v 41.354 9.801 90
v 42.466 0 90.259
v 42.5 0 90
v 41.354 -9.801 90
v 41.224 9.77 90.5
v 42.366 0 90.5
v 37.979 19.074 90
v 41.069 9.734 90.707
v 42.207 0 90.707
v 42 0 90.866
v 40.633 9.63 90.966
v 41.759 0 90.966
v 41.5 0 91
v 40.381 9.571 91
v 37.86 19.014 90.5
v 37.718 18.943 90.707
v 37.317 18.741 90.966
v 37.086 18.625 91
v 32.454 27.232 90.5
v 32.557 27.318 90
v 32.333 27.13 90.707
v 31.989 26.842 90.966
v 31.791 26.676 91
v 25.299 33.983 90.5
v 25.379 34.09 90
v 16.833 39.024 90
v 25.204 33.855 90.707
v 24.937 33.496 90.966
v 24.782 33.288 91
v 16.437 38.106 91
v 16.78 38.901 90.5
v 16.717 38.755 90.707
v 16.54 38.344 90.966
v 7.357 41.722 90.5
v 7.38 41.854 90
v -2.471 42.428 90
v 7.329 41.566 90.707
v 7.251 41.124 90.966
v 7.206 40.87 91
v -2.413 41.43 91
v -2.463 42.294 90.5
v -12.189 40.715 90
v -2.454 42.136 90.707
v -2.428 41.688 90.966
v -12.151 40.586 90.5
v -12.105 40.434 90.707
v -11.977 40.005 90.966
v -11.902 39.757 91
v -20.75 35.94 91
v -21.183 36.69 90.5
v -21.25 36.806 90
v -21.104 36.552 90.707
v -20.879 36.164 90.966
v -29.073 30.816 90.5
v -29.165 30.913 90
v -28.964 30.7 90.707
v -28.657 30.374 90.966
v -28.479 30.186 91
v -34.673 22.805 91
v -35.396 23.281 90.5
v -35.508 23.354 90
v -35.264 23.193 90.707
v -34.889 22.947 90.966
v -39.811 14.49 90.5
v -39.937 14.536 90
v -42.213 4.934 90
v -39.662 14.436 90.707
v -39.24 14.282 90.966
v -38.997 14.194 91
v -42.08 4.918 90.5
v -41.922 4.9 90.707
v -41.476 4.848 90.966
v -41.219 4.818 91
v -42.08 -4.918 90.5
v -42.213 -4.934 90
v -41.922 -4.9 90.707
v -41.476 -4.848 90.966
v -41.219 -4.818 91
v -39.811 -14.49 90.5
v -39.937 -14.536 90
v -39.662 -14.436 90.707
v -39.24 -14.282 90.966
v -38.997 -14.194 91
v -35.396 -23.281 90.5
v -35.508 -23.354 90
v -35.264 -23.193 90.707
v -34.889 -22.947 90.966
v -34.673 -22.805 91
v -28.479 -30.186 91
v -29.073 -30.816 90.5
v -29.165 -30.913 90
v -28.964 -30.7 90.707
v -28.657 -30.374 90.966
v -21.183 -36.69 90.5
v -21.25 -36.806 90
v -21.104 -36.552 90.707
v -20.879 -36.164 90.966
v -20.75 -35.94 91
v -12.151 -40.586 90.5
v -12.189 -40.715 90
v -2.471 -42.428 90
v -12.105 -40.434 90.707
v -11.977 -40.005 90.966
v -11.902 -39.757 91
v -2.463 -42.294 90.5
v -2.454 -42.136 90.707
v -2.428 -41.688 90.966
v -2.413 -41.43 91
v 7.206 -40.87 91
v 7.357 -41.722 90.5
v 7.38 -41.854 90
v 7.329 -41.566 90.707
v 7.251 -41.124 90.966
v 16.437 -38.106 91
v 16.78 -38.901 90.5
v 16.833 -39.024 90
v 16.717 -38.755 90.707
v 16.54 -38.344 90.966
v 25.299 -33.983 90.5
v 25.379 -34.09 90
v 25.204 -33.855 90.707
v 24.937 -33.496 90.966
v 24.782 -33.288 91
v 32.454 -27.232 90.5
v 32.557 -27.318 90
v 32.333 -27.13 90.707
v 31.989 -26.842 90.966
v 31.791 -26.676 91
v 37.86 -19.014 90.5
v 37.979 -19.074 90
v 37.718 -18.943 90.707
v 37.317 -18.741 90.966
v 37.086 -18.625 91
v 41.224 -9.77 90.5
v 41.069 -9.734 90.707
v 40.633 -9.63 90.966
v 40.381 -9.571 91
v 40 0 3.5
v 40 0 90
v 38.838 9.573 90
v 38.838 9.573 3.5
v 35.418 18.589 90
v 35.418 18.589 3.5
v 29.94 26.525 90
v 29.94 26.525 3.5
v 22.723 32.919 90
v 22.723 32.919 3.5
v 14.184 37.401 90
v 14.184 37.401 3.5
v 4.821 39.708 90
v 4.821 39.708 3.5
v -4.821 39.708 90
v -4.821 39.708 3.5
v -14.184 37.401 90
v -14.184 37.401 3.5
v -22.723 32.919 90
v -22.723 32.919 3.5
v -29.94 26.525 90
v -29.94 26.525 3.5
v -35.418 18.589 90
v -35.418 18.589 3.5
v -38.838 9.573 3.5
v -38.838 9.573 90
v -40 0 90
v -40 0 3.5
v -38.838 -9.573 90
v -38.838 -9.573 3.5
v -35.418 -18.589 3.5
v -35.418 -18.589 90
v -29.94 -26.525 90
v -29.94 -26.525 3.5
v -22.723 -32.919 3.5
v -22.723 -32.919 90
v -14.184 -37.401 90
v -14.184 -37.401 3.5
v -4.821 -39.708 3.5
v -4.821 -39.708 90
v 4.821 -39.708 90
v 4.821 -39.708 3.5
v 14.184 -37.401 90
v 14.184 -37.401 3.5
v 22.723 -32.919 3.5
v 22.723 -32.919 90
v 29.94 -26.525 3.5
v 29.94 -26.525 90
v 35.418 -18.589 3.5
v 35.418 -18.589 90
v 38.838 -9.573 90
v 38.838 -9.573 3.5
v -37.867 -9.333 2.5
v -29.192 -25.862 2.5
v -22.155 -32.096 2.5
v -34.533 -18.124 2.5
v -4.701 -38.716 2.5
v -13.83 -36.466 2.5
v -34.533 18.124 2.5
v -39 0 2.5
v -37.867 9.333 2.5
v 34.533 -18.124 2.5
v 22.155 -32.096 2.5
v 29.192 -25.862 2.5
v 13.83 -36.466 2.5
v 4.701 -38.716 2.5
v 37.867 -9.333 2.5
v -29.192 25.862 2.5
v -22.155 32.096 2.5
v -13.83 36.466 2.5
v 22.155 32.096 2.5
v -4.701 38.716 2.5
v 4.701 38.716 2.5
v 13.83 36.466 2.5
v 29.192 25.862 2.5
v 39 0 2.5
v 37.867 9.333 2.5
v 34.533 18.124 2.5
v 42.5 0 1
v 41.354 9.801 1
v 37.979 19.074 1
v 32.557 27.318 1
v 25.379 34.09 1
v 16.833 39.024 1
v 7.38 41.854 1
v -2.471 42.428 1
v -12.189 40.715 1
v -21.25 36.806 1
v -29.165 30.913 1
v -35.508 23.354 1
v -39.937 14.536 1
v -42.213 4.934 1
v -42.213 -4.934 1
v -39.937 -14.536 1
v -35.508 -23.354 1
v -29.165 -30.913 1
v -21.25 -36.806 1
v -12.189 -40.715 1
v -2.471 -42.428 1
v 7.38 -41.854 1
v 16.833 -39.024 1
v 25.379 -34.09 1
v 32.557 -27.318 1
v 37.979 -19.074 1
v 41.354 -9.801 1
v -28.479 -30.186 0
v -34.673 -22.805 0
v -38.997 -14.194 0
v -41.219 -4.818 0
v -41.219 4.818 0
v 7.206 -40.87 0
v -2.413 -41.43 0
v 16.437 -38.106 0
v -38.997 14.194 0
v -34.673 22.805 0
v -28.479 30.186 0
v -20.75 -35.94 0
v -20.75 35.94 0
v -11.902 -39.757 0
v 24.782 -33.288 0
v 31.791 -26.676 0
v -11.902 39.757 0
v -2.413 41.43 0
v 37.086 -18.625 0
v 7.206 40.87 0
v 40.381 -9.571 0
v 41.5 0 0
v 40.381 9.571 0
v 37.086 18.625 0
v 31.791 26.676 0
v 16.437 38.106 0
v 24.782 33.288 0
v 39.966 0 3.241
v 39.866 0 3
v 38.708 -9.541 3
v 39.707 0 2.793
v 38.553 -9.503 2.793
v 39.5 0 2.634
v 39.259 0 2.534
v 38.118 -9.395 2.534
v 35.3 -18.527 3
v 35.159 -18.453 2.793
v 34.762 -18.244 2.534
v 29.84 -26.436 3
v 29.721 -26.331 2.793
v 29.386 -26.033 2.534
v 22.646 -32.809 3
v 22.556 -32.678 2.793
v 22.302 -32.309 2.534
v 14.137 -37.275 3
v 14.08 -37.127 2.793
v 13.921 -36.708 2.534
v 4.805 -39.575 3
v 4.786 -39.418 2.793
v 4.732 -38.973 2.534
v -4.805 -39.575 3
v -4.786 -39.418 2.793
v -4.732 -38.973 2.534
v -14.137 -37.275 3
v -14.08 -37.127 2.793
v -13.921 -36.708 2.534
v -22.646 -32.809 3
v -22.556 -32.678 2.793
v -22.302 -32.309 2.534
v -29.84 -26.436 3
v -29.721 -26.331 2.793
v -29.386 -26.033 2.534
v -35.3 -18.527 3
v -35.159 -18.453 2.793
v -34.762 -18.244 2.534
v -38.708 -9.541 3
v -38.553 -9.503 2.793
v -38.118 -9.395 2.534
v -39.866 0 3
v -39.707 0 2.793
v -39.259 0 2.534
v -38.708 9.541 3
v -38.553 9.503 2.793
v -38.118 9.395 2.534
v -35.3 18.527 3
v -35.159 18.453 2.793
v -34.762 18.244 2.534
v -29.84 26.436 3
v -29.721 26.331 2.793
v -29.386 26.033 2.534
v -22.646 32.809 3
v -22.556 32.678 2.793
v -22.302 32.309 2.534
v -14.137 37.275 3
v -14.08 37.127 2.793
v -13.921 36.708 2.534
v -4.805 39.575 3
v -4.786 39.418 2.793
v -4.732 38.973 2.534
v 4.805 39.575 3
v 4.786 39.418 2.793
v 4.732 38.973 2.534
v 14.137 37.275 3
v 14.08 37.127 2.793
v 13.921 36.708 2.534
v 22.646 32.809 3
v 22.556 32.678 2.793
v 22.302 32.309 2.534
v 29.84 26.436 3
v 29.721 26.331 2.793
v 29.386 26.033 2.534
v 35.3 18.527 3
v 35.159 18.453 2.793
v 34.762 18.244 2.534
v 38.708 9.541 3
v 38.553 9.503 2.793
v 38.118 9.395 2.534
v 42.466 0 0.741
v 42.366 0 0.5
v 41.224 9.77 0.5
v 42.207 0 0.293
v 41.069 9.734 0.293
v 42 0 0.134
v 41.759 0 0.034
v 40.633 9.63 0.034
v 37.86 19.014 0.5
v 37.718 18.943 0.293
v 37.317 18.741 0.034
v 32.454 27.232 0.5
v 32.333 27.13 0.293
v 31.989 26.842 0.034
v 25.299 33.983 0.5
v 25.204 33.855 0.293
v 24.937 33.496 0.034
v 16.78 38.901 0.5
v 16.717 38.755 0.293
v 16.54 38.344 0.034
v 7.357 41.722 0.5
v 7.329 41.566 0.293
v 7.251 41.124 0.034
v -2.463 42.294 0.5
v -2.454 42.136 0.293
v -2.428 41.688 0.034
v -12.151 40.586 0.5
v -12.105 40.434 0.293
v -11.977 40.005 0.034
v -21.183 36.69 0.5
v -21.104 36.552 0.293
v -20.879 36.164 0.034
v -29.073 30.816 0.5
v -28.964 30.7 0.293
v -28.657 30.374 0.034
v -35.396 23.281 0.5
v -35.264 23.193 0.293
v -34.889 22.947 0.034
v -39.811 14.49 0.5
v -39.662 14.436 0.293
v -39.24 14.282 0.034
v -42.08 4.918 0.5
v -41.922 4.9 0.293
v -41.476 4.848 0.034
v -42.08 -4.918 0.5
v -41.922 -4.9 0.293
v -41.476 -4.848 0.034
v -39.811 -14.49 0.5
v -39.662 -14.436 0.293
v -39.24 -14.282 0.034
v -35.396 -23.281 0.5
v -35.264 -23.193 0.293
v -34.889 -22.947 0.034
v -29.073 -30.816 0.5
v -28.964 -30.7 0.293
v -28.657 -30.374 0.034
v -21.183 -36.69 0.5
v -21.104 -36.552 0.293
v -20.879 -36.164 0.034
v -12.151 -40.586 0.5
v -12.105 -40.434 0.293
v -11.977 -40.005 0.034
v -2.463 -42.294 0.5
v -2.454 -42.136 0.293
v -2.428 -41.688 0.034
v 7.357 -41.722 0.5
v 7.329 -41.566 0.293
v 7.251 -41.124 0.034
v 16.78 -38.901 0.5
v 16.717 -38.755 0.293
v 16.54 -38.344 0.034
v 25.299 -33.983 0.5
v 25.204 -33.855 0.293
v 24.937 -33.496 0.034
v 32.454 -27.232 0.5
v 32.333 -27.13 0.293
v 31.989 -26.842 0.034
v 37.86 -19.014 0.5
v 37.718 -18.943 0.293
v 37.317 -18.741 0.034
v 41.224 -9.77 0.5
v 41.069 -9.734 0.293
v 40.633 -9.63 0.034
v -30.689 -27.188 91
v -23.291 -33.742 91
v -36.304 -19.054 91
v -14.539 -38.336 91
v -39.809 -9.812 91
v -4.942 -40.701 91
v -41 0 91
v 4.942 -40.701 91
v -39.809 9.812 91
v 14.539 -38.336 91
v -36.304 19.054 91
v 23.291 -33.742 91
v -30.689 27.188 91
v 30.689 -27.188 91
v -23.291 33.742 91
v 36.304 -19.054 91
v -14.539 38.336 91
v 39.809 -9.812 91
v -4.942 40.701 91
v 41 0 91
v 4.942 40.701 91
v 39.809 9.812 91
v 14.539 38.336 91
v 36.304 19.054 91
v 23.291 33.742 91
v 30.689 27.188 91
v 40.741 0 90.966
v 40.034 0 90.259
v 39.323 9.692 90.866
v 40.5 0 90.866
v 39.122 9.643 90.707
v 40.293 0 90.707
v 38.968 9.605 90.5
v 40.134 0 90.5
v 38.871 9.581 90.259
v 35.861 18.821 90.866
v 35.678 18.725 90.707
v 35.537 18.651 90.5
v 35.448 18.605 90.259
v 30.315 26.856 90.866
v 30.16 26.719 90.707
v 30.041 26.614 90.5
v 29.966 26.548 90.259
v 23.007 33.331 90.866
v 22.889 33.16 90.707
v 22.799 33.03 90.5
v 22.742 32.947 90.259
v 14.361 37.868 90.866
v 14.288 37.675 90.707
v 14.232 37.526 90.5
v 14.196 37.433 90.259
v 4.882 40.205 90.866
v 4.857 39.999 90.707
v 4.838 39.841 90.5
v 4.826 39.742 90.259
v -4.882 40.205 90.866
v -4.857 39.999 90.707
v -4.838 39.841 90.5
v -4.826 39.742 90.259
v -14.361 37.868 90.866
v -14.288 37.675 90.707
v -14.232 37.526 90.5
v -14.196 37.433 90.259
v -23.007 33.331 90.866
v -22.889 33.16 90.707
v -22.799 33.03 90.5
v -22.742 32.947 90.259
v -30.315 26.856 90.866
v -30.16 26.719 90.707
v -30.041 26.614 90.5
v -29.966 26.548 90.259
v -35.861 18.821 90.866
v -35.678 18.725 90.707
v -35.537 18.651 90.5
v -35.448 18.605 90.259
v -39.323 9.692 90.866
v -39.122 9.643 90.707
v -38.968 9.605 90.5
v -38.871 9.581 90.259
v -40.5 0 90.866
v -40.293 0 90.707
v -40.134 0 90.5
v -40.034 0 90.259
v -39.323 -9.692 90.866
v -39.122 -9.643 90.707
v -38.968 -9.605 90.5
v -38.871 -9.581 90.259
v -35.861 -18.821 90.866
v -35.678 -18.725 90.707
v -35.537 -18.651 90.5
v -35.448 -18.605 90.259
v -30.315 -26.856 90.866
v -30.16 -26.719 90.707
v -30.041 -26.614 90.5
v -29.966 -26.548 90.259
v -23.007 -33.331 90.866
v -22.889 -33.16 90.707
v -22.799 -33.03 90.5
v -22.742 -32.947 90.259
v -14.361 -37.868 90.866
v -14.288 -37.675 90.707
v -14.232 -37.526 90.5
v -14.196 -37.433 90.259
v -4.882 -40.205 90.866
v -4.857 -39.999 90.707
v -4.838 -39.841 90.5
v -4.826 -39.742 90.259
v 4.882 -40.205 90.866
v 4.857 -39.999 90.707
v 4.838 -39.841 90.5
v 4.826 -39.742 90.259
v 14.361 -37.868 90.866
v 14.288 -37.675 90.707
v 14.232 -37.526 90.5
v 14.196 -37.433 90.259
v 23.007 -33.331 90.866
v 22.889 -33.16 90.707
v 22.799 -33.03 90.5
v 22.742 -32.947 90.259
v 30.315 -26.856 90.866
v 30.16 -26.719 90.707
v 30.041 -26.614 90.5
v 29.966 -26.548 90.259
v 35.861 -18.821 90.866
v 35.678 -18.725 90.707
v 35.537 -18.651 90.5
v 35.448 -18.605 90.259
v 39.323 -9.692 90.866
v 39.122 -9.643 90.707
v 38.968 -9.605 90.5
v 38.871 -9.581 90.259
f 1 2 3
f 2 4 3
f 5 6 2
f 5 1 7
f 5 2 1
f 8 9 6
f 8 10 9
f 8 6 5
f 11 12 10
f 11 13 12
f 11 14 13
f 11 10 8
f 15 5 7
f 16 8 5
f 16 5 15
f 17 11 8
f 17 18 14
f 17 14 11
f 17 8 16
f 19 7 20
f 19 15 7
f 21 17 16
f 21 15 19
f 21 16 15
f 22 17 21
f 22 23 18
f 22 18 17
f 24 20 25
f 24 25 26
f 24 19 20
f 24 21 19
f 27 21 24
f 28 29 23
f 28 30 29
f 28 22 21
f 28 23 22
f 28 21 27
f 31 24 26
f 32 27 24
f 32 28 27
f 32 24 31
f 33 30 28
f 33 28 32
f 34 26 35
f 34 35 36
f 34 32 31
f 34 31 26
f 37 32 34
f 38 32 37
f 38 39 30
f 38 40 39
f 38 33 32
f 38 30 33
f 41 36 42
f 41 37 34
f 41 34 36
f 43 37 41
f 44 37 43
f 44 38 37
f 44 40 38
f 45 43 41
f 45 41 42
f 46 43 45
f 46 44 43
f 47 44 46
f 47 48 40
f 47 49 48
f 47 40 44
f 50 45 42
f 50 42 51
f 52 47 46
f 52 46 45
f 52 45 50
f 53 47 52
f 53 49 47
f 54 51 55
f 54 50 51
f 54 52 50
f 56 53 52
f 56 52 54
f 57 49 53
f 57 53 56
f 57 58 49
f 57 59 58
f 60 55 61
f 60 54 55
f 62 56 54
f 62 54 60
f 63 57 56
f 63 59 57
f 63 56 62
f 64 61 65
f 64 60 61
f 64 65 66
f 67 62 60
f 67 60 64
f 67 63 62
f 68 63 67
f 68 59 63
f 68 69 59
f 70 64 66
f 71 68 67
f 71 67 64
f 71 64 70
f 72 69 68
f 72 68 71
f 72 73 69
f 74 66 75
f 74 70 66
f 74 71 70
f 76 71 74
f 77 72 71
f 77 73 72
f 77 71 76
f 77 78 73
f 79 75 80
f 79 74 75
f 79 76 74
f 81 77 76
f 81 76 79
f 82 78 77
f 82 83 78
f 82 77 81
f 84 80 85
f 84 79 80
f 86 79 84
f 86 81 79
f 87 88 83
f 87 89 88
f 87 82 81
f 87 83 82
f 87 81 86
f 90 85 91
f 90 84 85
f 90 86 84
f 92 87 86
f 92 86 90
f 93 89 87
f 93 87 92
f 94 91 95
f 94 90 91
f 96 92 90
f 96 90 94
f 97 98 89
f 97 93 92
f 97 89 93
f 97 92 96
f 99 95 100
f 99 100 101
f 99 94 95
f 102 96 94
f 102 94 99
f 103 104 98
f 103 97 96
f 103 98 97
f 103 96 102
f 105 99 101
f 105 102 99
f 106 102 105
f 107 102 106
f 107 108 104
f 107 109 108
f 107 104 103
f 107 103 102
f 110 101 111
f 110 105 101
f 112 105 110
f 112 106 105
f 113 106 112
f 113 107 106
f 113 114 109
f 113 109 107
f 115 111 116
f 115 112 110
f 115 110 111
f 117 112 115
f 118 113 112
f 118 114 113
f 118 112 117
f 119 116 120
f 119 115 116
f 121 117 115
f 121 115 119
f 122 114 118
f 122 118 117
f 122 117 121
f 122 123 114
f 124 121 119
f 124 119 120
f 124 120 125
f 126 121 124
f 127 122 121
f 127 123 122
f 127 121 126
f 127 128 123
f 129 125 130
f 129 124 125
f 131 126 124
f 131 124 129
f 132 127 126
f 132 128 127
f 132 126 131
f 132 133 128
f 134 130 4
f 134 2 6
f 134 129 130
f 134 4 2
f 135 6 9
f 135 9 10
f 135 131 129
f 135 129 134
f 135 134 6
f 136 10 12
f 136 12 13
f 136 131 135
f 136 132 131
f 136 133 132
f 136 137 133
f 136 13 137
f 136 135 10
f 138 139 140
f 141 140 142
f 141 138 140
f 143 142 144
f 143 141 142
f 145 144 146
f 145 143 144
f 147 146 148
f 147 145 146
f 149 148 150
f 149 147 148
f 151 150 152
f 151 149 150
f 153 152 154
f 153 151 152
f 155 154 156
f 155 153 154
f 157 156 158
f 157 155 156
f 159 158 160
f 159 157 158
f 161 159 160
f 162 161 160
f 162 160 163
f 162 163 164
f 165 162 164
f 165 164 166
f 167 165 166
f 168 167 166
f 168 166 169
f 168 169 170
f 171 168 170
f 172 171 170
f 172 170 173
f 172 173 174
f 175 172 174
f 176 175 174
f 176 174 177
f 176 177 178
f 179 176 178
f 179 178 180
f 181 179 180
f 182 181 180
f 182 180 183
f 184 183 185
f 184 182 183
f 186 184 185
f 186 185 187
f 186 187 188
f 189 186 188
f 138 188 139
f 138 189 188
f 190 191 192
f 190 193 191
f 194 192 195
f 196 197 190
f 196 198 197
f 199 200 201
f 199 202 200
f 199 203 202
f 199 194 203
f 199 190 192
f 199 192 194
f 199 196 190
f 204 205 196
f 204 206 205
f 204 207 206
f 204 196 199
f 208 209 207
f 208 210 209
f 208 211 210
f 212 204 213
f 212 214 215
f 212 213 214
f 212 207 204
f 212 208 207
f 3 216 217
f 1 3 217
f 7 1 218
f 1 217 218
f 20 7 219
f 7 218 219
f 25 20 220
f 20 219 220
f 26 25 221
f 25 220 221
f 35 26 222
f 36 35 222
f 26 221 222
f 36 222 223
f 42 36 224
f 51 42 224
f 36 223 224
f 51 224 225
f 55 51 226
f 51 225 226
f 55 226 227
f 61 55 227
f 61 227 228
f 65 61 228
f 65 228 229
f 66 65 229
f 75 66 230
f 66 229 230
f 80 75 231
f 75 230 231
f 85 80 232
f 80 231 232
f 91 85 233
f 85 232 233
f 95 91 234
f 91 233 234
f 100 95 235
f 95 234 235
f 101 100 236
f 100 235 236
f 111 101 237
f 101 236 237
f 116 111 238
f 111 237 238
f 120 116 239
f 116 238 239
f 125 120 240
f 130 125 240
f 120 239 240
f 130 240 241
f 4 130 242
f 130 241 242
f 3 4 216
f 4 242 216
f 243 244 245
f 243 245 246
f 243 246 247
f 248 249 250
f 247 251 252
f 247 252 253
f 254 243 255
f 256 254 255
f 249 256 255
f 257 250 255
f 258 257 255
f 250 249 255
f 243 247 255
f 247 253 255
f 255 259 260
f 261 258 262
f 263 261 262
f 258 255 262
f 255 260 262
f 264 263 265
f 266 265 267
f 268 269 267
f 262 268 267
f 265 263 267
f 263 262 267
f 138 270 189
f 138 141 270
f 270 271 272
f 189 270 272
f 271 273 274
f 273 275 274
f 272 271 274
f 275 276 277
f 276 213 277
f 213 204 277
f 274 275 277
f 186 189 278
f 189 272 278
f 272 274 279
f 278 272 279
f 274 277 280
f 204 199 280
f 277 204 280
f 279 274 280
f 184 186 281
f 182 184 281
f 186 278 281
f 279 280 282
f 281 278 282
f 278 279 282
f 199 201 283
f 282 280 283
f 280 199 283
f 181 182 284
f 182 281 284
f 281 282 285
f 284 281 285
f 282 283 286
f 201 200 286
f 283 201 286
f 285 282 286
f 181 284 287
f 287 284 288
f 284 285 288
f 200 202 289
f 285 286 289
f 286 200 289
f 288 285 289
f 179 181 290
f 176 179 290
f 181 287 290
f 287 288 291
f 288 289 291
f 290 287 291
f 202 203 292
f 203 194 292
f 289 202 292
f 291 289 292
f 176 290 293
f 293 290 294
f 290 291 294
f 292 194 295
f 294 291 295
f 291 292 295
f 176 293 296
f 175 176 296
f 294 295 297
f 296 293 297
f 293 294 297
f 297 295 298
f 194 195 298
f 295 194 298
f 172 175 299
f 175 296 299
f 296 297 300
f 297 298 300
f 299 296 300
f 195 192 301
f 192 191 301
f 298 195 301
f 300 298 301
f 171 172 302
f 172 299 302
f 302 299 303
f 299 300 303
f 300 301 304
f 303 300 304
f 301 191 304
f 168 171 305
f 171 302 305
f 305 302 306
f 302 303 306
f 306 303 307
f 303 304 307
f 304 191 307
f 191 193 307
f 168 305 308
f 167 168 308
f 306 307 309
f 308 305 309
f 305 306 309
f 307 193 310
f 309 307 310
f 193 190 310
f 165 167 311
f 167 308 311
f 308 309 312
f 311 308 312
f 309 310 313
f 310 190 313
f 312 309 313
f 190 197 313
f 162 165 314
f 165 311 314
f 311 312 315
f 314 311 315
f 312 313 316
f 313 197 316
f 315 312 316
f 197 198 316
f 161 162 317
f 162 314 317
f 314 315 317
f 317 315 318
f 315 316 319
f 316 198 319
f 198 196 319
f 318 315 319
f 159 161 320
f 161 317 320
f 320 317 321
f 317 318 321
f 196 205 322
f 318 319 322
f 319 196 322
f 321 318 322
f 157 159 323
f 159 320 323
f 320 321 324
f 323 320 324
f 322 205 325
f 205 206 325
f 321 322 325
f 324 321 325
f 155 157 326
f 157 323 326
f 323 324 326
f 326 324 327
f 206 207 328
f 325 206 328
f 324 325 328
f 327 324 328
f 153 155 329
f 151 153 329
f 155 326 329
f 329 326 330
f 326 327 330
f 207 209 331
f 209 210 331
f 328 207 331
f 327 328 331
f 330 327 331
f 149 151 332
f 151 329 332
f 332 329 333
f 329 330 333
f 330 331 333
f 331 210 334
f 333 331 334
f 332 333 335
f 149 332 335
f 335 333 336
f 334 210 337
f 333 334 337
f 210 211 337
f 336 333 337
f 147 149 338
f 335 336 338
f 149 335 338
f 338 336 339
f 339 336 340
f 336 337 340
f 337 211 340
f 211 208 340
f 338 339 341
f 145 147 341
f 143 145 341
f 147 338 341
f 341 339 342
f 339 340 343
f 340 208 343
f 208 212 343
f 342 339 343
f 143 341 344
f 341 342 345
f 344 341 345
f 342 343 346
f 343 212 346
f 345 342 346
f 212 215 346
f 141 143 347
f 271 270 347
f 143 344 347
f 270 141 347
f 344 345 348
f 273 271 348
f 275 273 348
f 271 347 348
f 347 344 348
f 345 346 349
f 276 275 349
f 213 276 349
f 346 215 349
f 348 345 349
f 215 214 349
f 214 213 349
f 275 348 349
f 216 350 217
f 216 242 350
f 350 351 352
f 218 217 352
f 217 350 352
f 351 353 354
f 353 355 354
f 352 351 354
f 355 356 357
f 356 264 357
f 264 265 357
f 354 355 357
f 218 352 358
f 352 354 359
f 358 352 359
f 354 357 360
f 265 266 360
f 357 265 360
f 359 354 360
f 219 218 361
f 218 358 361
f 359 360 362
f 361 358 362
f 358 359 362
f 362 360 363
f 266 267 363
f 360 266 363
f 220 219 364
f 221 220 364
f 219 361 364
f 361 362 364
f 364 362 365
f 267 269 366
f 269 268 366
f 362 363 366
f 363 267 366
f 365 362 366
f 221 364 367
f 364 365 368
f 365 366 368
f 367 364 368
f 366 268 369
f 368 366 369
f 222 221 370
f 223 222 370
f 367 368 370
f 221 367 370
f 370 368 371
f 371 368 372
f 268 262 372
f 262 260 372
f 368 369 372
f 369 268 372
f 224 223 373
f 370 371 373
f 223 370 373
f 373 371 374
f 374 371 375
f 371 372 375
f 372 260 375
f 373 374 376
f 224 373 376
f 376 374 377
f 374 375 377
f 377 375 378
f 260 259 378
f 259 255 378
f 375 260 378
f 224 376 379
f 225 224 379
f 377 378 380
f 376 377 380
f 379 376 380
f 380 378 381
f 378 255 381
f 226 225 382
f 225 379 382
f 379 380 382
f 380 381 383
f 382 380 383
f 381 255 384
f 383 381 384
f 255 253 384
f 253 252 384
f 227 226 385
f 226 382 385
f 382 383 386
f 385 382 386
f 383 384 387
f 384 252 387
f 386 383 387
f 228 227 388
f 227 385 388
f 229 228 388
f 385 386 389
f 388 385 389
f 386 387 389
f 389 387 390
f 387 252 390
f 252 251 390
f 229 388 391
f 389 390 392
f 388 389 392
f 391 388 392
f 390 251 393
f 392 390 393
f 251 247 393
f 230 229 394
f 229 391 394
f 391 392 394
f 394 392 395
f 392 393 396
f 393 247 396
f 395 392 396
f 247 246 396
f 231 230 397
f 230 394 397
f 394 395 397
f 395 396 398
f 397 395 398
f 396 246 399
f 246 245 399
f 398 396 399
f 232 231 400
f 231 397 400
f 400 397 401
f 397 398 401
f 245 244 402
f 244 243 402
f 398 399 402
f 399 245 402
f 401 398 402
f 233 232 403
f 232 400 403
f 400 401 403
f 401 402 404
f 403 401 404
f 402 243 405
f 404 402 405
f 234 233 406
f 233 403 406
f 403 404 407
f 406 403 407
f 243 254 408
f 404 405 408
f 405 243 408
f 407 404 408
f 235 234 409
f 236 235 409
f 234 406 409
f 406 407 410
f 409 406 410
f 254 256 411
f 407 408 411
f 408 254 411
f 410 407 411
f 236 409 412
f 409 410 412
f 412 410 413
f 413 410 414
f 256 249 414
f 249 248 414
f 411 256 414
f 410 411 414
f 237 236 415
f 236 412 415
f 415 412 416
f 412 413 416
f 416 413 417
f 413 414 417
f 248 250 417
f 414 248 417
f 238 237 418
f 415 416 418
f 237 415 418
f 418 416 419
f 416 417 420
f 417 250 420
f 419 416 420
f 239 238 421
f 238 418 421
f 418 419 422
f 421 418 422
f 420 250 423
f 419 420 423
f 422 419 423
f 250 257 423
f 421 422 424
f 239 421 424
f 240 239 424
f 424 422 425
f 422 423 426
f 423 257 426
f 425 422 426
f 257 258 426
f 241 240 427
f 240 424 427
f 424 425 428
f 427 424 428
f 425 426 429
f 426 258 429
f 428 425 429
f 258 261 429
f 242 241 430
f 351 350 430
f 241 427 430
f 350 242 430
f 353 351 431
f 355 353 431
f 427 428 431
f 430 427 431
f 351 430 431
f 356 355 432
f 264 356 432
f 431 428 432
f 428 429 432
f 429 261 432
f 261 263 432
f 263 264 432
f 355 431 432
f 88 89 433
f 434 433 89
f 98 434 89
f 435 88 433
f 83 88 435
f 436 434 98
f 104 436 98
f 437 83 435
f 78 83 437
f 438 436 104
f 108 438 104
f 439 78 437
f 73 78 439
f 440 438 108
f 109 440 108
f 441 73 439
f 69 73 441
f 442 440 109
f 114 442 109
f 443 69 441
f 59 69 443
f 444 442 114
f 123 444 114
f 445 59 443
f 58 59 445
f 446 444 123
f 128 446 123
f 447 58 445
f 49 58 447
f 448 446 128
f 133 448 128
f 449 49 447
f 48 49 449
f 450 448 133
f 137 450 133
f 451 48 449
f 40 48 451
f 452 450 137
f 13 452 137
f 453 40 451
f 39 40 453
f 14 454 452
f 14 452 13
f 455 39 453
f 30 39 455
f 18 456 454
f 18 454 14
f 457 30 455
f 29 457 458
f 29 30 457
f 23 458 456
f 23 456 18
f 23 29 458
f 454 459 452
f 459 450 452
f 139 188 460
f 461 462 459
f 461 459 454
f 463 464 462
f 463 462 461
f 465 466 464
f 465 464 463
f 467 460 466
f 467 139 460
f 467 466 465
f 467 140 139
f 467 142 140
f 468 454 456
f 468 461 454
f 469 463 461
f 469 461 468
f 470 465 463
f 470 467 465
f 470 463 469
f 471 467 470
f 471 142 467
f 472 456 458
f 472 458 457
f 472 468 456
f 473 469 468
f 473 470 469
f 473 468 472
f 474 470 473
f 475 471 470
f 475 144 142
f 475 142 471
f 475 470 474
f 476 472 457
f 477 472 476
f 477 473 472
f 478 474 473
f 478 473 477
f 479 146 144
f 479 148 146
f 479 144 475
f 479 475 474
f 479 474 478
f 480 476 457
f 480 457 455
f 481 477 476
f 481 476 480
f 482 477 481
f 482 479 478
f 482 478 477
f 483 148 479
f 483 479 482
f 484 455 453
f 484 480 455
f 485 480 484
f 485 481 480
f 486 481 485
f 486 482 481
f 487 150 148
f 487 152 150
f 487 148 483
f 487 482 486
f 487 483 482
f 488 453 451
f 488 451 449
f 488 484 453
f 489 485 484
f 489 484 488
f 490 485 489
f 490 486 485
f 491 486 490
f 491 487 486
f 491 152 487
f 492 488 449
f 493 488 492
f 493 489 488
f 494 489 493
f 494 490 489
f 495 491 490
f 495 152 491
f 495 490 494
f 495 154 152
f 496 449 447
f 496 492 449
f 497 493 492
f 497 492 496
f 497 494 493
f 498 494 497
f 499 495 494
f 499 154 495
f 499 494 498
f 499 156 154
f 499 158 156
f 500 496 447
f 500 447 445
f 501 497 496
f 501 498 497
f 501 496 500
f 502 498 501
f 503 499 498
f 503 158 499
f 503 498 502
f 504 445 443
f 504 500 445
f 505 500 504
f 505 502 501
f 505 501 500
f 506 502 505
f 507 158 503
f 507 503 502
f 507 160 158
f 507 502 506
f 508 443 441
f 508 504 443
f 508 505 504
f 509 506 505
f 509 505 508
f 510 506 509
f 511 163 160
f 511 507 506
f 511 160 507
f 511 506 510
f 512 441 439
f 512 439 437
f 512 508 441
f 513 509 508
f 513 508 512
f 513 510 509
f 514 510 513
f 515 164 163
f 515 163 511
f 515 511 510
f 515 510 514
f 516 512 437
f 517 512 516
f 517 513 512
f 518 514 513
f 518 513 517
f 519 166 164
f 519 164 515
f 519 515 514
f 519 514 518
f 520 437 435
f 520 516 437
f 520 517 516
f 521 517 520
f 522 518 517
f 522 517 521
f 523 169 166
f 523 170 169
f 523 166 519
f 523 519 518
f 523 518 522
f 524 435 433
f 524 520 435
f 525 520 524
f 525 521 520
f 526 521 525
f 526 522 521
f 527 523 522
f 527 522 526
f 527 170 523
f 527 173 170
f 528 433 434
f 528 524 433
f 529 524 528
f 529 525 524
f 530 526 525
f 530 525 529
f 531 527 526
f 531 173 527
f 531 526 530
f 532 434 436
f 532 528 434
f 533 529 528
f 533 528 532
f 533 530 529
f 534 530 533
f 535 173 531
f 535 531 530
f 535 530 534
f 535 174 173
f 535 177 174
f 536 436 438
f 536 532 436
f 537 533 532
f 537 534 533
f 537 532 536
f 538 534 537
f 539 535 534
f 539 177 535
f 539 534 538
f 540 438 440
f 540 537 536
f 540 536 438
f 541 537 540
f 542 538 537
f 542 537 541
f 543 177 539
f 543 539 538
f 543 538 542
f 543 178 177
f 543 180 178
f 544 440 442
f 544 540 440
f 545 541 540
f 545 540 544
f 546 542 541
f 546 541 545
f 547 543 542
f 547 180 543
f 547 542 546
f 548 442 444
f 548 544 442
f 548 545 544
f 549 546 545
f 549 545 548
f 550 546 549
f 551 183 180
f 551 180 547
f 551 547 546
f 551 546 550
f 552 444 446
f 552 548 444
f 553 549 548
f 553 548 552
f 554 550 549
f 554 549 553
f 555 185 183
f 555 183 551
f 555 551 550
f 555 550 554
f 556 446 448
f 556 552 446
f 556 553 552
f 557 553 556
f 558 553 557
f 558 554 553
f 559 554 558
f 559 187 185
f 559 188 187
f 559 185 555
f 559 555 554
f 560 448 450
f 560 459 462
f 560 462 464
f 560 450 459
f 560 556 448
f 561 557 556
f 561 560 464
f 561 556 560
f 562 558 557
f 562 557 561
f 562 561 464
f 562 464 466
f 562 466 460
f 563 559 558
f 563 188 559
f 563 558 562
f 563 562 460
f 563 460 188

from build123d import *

# Parameters (mm, degrees)
F0_R     = 42.5
F1_DEPTH = 91
F5_T     = -2.5
F6_R     = 1


with BuildPart() as f1:
    # F0 (on Top) → F1 (new body)
    with BuildSketch(Plane.XY):
        Circle(F0_R)
    extrude(amount=F1_DEPTH)

    # F5
    f5_openings = [f1.faces().sort_by_distance(p)[0] for p in [
        (0, 0, 91),
    ]]
    offset(amount=F5_T, openings=f5_openings)

    # F6
    f6_edges = [f1.edges().sort_by_distance(p)[0] for p in [
        (-40, 0, 2.5),
        (42.5, 0, 45.5),
        (-42.5, 0, 0),
        (-42.5, 0, 91),
        (40, 0, 46.75),
        (-40, 0, 91),
    ]]
    fillet(f6_edges, radius=F6_R)


solid = f1.part
